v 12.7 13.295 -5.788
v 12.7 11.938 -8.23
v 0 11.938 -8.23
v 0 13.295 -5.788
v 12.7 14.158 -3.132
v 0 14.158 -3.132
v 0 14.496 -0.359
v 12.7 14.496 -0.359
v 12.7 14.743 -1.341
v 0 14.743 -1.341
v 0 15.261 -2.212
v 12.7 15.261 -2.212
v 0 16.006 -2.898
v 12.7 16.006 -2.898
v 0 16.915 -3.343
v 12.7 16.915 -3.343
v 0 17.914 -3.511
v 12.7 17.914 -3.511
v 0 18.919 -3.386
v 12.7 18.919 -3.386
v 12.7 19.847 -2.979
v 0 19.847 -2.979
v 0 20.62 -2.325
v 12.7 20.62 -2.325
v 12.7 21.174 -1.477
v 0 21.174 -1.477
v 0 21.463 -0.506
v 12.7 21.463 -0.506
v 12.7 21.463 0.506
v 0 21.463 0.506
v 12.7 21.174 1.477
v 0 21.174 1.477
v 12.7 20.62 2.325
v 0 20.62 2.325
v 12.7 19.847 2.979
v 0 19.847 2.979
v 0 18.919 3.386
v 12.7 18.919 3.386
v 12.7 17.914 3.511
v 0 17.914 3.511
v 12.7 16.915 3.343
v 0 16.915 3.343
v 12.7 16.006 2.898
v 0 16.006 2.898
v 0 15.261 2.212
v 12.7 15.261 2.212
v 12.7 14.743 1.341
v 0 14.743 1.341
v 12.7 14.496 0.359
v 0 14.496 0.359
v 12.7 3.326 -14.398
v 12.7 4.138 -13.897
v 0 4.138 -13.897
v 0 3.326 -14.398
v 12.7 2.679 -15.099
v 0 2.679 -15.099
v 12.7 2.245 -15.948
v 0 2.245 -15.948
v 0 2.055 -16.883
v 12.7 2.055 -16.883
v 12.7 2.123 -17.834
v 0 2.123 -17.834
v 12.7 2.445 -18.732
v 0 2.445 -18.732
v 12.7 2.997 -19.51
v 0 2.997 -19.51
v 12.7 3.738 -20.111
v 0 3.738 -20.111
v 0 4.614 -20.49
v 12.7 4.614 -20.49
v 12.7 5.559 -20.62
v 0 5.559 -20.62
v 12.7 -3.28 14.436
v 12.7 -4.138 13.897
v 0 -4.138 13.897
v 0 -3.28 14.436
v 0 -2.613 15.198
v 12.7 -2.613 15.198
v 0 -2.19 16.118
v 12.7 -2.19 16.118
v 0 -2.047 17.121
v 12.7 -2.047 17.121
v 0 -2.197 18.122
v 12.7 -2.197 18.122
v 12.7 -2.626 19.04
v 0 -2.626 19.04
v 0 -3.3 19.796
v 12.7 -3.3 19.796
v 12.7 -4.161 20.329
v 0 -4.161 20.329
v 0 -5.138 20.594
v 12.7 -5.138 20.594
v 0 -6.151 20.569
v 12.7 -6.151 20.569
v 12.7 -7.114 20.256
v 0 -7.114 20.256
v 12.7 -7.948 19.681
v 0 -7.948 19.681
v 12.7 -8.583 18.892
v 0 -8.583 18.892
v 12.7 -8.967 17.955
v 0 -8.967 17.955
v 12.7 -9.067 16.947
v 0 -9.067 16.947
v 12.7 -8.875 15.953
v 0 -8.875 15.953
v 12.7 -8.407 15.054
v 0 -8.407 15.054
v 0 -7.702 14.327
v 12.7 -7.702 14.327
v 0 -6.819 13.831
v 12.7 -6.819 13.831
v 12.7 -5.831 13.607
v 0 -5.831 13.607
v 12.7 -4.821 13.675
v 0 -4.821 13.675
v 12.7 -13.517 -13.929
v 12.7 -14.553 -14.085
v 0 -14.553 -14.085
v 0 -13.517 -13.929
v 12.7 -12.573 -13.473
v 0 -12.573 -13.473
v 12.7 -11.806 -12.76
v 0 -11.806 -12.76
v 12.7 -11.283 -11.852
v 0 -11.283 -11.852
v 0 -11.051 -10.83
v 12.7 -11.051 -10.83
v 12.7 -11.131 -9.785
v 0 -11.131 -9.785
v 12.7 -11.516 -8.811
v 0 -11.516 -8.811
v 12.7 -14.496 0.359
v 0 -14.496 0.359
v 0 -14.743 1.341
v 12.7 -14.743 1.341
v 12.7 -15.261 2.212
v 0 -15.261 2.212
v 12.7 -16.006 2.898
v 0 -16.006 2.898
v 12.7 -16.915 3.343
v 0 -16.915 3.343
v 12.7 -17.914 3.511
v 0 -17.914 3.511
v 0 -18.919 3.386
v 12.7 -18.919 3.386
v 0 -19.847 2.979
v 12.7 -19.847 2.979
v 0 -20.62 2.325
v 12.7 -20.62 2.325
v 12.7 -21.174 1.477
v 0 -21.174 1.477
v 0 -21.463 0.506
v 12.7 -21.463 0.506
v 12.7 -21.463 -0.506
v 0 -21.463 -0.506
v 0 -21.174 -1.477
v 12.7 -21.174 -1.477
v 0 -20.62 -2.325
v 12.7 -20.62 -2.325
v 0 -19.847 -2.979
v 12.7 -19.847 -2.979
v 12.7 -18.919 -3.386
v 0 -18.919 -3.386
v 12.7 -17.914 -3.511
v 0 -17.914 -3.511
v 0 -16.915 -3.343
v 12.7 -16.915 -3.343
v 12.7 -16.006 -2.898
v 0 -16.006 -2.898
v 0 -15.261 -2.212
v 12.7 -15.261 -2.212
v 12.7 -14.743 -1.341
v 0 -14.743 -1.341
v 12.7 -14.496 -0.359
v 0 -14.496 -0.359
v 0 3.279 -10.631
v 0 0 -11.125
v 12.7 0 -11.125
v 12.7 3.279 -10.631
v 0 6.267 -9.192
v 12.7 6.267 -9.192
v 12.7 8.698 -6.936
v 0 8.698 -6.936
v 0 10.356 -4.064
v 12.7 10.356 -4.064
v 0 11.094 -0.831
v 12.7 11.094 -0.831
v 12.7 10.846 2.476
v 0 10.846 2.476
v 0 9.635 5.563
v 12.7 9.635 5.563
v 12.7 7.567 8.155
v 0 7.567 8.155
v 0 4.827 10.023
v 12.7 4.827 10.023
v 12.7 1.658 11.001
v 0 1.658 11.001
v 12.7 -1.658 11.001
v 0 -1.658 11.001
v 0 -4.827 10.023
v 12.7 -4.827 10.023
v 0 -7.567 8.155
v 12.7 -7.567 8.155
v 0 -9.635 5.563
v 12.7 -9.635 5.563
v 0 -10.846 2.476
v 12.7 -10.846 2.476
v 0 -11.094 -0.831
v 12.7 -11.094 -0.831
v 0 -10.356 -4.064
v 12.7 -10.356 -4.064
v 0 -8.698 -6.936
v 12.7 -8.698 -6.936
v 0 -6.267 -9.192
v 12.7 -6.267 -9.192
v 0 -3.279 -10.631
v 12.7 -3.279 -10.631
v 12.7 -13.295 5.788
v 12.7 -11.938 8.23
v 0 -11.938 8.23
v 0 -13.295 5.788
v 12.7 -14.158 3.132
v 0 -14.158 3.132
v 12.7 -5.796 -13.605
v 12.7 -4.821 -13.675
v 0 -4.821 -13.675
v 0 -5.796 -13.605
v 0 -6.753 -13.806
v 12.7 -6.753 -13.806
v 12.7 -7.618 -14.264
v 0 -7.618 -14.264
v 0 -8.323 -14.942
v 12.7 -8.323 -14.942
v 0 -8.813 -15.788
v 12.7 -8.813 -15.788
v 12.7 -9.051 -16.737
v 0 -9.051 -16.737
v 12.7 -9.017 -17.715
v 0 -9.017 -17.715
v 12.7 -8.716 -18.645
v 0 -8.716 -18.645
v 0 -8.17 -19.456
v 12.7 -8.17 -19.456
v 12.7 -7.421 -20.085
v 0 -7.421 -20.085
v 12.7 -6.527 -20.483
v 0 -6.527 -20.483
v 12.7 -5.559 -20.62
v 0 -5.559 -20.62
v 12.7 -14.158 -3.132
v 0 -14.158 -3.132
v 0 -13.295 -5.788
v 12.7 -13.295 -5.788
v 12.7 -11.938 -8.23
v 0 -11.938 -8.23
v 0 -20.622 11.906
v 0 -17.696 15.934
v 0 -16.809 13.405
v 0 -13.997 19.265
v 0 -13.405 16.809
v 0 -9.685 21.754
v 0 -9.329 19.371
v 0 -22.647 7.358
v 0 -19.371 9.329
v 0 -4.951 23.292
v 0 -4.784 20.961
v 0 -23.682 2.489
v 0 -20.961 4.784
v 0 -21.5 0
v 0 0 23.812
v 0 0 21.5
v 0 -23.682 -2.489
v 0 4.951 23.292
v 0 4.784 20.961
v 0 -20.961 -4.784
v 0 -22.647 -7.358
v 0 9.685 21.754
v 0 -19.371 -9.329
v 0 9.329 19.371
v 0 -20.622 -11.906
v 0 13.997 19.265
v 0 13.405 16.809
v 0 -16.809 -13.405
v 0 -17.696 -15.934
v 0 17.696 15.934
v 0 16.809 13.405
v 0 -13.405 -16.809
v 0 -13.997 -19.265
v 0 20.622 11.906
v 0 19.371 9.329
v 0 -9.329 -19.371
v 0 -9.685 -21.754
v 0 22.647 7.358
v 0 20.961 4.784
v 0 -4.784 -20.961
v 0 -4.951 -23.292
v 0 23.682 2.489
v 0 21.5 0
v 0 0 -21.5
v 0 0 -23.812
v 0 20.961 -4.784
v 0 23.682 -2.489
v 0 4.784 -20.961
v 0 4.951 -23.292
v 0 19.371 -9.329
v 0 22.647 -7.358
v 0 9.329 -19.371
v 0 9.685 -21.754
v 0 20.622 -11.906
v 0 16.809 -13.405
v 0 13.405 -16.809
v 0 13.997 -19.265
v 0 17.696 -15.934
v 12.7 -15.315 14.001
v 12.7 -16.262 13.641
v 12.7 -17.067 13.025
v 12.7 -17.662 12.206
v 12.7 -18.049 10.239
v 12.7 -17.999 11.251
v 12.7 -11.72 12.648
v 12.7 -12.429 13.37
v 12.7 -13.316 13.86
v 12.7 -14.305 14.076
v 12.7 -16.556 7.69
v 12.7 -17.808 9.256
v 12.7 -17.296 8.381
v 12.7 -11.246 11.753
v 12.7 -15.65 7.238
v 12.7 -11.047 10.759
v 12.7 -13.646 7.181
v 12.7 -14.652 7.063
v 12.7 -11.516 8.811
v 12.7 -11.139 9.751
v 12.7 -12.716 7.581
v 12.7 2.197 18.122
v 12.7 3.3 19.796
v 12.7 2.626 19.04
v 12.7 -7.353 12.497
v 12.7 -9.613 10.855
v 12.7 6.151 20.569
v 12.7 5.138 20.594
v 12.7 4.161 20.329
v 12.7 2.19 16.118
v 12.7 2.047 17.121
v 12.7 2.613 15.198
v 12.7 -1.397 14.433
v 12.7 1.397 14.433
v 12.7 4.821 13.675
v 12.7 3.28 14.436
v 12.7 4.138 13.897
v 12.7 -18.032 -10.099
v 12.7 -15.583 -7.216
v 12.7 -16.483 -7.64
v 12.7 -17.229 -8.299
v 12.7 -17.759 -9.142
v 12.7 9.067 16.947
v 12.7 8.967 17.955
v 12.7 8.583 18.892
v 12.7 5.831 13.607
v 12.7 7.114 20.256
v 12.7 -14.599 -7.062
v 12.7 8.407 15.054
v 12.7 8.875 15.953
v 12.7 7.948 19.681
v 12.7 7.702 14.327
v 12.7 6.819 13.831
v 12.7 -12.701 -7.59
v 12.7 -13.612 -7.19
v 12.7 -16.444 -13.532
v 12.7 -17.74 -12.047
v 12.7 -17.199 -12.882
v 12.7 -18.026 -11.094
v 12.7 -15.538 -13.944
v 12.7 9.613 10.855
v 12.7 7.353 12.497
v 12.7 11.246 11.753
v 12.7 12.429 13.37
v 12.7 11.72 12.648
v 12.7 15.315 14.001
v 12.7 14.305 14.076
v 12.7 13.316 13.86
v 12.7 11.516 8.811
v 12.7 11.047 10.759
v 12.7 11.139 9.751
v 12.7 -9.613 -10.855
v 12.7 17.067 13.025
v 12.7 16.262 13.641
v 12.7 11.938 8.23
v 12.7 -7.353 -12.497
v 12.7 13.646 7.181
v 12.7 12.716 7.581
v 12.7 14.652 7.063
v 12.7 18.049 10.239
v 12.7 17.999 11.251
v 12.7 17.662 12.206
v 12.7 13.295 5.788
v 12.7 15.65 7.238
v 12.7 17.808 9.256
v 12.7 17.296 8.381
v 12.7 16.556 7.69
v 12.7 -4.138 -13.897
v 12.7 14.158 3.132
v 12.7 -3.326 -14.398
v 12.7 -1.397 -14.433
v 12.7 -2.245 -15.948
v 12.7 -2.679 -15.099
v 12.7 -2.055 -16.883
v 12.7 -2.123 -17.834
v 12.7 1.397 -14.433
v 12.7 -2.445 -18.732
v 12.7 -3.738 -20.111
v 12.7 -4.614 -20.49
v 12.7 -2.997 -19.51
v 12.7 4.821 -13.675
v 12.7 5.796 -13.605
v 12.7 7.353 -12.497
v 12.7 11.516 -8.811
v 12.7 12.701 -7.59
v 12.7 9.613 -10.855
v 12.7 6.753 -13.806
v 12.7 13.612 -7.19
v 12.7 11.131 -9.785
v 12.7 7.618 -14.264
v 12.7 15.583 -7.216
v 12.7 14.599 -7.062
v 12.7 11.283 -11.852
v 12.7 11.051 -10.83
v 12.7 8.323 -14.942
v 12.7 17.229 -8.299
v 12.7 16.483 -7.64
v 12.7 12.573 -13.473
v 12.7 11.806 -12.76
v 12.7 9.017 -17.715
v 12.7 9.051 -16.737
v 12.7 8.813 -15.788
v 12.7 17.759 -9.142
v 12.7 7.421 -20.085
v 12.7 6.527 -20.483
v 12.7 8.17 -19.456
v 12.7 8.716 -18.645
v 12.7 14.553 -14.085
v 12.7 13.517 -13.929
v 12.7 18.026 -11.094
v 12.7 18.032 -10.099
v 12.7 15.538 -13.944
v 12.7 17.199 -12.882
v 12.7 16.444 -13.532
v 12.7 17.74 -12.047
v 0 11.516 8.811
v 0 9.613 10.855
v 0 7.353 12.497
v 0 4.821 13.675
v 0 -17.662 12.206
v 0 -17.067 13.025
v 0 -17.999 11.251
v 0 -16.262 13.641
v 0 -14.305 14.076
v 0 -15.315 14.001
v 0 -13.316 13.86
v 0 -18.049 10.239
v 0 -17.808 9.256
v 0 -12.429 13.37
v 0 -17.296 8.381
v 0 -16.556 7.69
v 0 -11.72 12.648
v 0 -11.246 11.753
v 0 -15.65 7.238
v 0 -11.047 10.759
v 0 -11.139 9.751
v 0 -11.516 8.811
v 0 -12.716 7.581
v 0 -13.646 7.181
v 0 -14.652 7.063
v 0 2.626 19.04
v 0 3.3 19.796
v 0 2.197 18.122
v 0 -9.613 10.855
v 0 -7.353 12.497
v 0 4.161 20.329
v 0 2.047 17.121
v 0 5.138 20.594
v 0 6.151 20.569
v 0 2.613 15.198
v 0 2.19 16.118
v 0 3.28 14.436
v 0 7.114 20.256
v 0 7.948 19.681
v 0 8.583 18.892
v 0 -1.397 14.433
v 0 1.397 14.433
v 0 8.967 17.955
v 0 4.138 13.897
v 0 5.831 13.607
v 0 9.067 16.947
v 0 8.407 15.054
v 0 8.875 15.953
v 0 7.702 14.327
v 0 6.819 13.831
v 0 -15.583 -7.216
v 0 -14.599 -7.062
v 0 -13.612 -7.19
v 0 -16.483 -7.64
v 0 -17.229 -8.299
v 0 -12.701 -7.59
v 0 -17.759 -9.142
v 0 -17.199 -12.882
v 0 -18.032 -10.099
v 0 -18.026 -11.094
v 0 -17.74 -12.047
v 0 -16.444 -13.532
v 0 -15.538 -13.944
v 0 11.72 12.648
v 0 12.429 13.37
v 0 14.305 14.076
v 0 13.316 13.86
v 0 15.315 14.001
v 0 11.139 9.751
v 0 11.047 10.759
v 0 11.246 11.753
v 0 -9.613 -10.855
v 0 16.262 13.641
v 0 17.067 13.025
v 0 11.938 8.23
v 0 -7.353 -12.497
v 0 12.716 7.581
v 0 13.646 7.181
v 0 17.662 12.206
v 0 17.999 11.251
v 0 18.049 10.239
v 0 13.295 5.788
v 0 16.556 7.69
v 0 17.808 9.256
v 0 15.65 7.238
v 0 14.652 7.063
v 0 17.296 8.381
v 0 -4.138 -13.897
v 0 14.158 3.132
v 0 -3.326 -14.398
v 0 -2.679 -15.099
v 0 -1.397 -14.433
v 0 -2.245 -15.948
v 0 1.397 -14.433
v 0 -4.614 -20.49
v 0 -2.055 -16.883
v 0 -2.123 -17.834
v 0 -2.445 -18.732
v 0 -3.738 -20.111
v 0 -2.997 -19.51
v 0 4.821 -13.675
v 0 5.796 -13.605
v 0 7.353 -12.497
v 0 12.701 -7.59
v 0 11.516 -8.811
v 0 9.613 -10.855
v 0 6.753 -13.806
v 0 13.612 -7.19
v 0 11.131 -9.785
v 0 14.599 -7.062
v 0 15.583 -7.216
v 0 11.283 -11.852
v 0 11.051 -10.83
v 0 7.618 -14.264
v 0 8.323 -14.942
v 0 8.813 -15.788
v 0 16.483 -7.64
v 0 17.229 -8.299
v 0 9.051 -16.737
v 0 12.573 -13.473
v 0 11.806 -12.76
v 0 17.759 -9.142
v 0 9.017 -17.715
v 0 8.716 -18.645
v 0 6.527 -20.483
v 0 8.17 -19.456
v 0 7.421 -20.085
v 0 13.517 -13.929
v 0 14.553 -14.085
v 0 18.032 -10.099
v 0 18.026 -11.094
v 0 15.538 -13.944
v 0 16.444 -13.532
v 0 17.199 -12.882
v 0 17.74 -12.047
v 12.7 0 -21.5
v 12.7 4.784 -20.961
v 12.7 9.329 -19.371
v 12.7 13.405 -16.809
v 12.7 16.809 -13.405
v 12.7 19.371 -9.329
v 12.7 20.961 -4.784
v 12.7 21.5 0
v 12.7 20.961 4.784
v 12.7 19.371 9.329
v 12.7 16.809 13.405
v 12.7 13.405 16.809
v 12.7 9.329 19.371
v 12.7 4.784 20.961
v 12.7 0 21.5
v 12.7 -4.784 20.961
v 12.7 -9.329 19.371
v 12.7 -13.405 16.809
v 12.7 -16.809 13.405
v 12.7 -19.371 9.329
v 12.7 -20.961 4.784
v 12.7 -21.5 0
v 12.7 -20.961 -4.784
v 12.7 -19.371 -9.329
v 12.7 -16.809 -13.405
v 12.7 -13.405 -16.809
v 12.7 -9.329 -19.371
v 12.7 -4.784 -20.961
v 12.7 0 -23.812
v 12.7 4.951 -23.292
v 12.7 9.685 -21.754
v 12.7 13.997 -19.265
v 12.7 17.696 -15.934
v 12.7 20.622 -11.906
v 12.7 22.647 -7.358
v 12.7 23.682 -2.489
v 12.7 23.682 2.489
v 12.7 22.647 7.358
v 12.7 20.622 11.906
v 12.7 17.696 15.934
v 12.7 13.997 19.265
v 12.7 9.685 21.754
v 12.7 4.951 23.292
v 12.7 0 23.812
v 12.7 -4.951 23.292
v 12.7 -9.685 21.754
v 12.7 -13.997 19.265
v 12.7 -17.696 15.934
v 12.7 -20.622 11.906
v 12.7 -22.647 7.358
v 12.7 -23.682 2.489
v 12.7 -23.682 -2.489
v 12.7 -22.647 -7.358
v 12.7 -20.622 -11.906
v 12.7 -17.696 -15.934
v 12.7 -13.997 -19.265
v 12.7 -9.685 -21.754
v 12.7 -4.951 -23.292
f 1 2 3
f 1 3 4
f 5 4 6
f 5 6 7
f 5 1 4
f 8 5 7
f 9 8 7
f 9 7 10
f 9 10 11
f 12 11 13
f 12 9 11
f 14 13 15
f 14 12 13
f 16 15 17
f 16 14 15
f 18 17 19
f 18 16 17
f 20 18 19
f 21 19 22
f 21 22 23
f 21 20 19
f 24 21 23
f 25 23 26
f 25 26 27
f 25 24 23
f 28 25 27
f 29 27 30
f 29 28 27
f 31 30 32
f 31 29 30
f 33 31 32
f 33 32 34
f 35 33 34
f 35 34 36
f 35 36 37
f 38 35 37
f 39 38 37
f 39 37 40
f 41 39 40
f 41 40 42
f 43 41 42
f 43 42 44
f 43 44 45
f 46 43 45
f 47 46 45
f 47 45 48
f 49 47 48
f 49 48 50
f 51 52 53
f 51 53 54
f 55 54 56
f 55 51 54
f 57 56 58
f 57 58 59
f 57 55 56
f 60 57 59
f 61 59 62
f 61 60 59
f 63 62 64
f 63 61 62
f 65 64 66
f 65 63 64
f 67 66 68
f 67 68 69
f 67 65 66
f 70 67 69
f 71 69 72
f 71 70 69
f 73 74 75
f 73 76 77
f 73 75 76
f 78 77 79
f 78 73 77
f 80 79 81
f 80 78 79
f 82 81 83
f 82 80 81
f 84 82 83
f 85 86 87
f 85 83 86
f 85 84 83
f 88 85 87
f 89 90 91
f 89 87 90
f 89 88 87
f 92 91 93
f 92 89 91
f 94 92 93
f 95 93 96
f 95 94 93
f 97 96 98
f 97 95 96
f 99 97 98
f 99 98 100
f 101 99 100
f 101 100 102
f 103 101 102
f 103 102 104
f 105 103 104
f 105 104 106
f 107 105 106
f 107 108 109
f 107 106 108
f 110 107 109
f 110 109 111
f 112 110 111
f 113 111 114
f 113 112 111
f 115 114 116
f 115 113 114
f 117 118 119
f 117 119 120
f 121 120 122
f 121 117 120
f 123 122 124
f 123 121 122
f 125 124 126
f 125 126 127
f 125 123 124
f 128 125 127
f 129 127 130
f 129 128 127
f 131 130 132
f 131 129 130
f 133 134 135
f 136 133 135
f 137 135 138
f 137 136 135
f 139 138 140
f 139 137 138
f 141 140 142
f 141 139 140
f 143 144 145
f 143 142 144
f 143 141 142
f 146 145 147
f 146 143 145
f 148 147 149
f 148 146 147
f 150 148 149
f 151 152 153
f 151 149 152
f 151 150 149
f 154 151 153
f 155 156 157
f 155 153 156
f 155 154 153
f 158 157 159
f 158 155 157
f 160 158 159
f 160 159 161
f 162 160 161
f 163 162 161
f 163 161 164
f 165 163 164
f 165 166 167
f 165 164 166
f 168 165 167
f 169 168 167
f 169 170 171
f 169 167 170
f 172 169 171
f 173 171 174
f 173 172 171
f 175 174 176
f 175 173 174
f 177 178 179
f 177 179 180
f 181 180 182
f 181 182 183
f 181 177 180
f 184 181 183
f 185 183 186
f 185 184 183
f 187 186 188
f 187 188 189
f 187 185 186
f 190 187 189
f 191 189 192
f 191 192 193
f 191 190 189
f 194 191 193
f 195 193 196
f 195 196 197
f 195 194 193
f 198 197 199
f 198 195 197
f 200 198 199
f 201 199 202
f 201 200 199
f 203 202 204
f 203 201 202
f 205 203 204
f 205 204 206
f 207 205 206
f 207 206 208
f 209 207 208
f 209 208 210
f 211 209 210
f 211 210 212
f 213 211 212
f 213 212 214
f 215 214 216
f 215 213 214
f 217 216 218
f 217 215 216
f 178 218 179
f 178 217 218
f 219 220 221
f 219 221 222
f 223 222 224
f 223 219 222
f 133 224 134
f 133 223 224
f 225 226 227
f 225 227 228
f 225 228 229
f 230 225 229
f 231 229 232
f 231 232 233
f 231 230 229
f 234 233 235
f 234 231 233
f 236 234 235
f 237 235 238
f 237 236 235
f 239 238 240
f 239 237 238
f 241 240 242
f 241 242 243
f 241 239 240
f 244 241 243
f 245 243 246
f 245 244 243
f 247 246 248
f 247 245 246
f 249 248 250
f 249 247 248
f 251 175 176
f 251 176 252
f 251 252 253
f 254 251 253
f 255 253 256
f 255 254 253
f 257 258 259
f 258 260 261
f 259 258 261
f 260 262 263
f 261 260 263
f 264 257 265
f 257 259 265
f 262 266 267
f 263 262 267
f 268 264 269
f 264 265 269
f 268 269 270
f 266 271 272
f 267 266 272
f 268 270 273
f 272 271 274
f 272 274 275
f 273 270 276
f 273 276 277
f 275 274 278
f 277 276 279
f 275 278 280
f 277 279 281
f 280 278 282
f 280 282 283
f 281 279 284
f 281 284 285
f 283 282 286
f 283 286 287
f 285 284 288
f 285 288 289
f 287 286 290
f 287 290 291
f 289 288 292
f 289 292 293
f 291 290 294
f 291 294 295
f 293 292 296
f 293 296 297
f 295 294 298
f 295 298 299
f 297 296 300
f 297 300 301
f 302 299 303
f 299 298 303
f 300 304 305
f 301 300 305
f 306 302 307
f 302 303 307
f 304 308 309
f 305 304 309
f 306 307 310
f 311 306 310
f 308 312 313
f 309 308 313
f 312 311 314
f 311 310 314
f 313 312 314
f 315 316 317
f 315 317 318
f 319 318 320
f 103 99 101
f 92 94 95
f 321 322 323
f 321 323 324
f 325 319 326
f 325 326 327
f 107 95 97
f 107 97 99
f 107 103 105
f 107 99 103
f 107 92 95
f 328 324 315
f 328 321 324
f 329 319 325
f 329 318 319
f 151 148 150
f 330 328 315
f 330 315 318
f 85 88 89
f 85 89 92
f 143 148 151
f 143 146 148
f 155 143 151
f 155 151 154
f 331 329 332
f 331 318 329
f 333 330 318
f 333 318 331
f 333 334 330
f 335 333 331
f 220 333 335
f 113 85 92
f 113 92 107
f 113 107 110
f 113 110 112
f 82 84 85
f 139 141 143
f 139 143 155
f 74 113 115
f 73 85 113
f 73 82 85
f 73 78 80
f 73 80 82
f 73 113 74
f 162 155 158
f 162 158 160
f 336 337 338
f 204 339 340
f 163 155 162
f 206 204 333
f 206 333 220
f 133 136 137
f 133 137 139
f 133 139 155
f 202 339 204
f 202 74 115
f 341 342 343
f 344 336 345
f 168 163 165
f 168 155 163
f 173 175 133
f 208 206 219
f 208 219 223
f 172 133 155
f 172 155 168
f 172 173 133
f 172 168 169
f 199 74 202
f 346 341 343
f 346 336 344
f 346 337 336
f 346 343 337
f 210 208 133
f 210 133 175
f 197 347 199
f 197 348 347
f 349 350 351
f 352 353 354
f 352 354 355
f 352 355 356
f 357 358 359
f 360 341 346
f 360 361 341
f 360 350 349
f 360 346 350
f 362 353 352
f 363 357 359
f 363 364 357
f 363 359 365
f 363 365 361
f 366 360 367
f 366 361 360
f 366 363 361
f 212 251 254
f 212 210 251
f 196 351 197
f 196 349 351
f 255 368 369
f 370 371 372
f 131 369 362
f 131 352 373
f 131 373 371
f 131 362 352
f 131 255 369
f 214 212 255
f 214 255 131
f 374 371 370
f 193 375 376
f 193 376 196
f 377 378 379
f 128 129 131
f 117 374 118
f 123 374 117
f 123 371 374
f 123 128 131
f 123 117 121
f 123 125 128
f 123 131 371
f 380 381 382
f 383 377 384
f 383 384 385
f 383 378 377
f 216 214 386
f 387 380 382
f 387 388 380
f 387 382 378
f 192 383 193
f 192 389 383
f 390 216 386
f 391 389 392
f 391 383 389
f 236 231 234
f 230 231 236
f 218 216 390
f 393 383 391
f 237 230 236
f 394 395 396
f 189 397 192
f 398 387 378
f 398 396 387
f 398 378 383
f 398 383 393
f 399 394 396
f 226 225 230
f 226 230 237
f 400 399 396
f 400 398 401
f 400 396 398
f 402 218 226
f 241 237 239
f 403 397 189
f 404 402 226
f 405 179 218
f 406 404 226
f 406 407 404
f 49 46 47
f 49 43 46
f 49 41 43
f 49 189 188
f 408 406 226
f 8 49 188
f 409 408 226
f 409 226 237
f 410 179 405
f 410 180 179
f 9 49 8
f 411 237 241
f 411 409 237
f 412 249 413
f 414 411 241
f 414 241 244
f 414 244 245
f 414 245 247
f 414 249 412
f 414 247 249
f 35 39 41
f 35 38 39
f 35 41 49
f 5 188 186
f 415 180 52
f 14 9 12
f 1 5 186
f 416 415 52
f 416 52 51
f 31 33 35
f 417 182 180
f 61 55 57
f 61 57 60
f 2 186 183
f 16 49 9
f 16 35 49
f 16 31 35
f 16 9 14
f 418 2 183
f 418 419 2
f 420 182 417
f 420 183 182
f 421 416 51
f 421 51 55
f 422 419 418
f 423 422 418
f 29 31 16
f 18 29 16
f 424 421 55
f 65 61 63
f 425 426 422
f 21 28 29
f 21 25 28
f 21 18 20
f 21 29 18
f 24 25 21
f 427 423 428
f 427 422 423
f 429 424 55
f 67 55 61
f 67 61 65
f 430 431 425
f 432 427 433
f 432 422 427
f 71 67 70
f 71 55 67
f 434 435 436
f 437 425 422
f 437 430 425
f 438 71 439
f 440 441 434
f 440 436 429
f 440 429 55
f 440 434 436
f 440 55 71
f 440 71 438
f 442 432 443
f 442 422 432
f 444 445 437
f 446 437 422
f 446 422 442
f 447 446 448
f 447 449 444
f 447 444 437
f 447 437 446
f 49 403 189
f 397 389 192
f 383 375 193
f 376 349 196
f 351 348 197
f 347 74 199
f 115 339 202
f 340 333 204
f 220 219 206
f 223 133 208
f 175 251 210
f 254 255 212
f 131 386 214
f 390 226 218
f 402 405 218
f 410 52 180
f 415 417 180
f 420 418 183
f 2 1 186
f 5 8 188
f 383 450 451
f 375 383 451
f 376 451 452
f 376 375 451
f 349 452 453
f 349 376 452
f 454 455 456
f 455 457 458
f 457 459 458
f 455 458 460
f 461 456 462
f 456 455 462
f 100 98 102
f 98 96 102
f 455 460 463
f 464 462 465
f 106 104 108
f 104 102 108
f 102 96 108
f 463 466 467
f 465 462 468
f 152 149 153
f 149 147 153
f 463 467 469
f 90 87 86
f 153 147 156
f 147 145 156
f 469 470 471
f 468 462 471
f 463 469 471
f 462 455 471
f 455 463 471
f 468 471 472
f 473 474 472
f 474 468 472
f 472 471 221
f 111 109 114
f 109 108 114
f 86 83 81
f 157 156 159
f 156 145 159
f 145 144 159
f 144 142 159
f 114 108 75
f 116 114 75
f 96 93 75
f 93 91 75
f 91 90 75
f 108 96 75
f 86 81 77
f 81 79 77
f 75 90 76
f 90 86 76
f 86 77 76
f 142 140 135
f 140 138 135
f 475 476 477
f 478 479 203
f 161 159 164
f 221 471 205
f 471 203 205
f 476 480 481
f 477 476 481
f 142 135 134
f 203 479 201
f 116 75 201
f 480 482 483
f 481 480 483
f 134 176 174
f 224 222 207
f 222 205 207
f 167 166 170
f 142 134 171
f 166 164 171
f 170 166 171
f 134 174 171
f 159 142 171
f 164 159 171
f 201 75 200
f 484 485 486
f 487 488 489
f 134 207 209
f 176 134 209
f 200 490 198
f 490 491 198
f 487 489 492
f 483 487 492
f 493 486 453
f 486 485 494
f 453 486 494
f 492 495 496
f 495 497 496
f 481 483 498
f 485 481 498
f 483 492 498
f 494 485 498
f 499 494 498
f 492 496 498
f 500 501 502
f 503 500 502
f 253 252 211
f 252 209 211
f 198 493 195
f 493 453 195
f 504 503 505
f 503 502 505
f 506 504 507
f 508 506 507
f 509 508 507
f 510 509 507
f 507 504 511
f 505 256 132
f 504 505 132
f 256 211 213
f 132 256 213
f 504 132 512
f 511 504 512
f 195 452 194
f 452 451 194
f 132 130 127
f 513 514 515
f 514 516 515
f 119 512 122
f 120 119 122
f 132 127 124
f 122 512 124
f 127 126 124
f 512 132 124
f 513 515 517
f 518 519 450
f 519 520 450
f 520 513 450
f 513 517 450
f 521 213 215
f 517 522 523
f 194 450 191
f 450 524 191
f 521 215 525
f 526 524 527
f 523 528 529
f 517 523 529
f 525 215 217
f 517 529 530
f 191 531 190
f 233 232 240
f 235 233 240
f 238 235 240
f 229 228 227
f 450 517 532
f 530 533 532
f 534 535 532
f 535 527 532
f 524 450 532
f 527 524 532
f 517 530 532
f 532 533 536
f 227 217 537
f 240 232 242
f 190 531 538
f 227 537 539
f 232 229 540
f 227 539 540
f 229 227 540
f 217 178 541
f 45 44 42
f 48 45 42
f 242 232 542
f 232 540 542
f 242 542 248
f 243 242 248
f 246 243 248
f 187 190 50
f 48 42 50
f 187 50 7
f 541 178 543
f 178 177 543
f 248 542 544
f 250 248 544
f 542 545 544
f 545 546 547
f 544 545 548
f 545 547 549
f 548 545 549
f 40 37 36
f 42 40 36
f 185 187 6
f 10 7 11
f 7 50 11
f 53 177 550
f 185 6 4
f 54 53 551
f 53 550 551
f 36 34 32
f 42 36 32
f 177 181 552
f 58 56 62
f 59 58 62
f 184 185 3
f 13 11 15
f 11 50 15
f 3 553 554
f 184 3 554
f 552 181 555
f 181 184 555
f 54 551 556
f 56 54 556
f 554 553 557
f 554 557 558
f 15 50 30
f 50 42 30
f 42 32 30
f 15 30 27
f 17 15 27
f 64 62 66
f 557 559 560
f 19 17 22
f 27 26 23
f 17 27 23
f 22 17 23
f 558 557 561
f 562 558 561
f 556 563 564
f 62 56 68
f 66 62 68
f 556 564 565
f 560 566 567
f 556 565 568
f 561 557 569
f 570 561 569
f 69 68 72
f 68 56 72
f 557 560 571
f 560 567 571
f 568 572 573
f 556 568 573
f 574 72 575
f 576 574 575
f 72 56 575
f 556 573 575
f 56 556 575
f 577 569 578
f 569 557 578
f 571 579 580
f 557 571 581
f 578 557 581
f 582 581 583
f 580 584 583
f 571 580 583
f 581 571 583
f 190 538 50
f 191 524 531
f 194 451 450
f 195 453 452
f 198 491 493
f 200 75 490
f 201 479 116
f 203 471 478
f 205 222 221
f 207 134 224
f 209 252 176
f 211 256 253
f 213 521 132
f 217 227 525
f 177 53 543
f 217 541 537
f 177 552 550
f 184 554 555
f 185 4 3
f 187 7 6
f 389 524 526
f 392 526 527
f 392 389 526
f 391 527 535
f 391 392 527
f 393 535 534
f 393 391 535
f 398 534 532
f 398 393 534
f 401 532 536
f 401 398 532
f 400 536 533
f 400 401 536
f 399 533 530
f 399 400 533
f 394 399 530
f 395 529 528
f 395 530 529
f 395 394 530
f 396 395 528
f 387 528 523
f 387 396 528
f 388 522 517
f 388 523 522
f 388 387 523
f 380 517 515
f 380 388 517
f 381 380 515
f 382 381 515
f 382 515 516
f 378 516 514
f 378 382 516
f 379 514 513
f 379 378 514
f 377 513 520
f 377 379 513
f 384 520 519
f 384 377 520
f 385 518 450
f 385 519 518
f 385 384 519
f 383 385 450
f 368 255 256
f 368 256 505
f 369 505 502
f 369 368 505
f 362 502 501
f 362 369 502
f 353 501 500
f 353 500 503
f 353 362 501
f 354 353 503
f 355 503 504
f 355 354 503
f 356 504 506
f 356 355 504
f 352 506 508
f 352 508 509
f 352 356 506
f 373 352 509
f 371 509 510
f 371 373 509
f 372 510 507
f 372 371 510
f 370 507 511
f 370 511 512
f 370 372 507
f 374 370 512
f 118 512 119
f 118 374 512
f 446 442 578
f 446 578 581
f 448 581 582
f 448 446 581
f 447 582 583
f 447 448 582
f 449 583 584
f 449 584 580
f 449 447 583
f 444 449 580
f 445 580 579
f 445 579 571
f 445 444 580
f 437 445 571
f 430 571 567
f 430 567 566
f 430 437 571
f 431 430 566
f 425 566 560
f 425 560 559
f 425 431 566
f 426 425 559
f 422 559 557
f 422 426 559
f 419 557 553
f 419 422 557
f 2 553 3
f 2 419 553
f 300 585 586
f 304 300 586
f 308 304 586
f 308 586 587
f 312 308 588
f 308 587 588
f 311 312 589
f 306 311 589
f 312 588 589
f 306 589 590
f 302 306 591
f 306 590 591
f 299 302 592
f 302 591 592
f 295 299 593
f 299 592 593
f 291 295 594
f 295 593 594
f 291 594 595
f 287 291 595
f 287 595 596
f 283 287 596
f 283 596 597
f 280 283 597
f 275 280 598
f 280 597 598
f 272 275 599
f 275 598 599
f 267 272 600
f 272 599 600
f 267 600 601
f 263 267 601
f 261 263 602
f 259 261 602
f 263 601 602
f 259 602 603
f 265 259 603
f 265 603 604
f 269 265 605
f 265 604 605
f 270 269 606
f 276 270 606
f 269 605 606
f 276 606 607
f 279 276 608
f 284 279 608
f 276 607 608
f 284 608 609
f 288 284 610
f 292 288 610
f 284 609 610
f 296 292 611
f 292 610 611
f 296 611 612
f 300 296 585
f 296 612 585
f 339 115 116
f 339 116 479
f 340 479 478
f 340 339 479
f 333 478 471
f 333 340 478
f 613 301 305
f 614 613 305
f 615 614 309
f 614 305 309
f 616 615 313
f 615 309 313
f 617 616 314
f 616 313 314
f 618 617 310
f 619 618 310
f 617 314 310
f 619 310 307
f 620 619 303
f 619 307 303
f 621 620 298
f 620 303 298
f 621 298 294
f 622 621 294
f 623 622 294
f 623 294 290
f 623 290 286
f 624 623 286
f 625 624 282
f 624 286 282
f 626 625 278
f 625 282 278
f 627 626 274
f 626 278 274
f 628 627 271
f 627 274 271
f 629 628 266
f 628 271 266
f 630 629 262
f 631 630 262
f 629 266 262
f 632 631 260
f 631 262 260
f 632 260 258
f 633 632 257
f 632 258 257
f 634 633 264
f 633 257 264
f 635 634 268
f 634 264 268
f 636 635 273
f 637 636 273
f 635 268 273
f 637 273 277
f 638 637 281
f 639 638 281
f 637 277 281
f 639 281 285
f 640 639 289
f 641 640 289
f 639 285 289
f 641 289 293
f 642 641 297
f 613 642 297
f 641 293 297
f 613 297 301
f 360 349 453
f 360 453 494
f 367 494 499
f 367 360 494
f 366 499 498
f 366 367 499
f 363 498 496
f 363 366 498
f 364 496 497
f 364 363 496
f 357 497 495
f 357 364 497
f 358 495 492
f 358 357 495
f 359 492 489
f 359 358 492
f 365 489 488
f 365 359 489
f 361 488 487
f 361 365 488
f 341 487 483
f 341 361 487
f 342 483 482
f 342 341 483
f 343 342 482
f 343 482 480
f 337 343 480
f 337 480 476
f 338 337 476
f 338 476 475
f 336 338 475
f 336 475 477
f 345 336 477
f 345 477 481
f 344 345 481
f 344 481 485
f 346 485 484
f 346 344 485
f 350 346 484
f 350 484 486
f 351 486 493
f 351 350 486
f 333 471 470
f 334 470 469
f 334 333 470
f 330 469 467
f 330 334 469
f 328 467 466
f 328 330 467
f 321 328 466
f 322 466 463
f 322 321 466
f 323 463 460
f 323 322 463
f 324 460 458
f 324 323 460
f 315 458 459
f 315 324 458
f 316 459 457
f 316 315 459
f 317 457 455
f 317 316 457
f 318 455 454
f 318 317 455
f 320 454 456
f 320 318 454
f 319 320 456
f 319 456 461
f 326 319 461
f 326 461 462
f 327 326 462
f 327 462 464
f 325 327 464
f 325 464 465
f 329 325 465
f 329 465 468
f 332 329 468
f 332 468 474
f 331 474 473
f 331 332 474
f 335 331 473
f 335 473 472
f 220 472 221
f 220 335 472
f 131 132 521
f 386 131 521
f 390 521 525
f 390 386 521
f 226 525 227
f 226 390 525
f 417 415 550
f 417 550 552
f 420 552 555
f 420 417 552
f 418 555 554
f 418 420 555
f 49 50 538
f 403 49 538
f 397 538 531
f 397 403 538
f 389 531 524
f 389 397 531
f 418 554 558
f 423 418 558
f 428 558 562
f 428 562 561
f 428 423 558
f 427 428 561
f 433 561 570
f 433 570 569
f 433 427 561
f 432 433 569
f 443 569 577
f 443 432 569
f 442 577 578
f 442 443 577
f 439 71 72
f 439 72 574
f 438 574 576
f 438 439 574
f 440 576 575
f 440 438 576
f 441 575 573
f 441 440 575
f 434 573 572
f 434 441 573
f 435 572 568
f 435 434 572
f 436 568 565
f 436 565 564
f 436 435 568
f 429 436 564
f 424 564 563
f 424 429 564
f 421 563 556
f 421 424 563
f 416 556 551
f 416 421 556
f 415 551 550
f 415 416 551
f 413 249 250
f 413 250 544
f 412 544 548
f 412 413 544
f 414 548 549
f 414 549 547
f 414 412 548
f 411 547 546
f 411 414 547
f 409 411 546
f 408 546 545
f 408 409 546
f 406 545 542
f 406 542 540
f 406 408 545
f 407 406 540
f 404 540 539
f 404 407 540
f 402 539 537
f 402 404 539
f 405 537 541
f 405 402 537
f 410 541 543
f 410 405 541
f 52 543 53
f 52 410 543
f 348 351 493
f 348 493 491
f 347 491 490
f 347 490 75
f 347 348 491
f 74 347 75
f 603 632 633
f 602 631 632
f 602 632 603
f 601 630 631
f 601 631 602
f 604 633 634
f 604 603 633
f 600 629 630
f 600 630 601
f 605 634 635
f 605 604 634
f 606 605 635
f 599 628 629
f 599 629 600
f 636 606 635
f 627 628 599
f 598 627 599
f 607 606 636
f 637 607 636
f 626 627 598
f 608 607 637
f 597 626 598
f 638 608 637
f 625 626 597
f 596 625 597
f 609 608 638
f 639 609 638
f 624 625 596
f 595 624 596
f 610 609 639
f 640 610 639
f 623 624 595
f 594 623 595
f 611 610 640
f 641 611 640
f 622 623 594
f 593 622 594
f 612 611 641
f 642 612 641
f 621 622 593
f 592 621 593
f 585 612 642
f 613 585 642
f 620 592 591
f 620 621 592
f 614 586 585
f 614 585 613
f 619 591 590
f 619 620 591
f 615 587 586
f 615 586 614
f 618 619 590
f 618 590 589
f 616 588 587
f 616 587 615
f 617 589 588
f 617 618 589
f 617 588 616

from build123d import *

# Parameters (mm, degrees)
CROQUIS1_R              = 23.8125
CROQUIS1_R_2            = 11.125
SALIENTE_EXTRUIR1_DEPTH = 12.7
CROQUIS2_R              = 21.5
CROQUIS2_R_2            = 14.5
CORTAR_EXTRUIR1_DEPTH   = 12.7
CROQUIS3_R              = 3.511424915
SALIENTE_EXTRUIR2_DEPTH = 12.7


with BuildPart() as part:
    # Croquis1 → Saliente-Extruir1 (new body)
    with BuildSketch(Plane(origin=(0, 0, 0), x_dir=(0, 0, -1), z_dir=(1, 0, 0))):
        Circle(CROQUIS1_R)
        Circle(CROQUIS1_R_2, mode=Mode.SUBTRACT)
    extrude(amount=SALIENTE_EXTRUIR1_DEPTH)

    # Croquis2 → Cortar-Extruir1 (cut)
    with BuildSketch(Plane(origin=(12.7, 0, 0), x_dir=(0, 0, -1), z_dir=(1, 0, 0))):
        Circle(CROQUIS2_R)
        Circle(CROQUIS2_R_2, mode=Mode.SUBTRACT)
    extrude(amount=-CORTAR_EXTRUIR1_DEPTH, mode=Mode.SUBTRACT)


with BuildPart() as cortar_extruir1_piece_1:
    # of the separate pieces the step leaves, piece 1, a body of its own (cortar_extruir1_pieces)
    add(part.part.solids().sort_by_distance((0, 0, -23.8125))[0])


with BuildPart() as cortar_extruir1_piece_2:
    # of the separate pieces the step leaves, piece 2, a body of its own (cortar_extruir1_pieces)
    add(part.part.solids().sort_by_distance((0, 0, -14.5))[0])

    # Croquis3 → Saliente-Extruir2 (add)
    with BuildSketch(Plane(origin=(12.7, 0, 0), x_dir=(0, 0, -1), z_dir=(1, 0, 0))):
        with Locations((0, 17.988575085)):
            Circle(CROQUIS3_R)
        with Locations((10.573419145, 14.553062949)):
            Circle(CROQUIS3_R)
        with Locations((17.108151554, 5.558775406)):
            Circle(CROQUIS3_R)
        with Locations((17.108151554, -5.558775406)):
            Circle(CROQUIS3_R)
        with Locations((10.573419145, -14.553062949)):
            Circle(CROQUIS3_R)
        with Locations((0, -17.988575085)):
            Circle(CROQUIS3_R)
        with Locations((-10.573419145, -14.553062949)):
            Circle(CROQUIS3_R)
        with Locations((-17.108151554, -5.558775406)):
            Circle(CROQUIS3_R)
        with Locations((-17.108151554, 5.558775406)):
            Circle(CROQUIS3_R)
        with Locations((-10.573419145, 14.553062949)):
            Circle(CROQUIS3_R)
    extrude(amount=-SALIENTE_EXTRUIR2_DEPTH)


solid = Compound([cortar_extruir1_piece_1.part, cortar_extruir1_piece_2.part])
